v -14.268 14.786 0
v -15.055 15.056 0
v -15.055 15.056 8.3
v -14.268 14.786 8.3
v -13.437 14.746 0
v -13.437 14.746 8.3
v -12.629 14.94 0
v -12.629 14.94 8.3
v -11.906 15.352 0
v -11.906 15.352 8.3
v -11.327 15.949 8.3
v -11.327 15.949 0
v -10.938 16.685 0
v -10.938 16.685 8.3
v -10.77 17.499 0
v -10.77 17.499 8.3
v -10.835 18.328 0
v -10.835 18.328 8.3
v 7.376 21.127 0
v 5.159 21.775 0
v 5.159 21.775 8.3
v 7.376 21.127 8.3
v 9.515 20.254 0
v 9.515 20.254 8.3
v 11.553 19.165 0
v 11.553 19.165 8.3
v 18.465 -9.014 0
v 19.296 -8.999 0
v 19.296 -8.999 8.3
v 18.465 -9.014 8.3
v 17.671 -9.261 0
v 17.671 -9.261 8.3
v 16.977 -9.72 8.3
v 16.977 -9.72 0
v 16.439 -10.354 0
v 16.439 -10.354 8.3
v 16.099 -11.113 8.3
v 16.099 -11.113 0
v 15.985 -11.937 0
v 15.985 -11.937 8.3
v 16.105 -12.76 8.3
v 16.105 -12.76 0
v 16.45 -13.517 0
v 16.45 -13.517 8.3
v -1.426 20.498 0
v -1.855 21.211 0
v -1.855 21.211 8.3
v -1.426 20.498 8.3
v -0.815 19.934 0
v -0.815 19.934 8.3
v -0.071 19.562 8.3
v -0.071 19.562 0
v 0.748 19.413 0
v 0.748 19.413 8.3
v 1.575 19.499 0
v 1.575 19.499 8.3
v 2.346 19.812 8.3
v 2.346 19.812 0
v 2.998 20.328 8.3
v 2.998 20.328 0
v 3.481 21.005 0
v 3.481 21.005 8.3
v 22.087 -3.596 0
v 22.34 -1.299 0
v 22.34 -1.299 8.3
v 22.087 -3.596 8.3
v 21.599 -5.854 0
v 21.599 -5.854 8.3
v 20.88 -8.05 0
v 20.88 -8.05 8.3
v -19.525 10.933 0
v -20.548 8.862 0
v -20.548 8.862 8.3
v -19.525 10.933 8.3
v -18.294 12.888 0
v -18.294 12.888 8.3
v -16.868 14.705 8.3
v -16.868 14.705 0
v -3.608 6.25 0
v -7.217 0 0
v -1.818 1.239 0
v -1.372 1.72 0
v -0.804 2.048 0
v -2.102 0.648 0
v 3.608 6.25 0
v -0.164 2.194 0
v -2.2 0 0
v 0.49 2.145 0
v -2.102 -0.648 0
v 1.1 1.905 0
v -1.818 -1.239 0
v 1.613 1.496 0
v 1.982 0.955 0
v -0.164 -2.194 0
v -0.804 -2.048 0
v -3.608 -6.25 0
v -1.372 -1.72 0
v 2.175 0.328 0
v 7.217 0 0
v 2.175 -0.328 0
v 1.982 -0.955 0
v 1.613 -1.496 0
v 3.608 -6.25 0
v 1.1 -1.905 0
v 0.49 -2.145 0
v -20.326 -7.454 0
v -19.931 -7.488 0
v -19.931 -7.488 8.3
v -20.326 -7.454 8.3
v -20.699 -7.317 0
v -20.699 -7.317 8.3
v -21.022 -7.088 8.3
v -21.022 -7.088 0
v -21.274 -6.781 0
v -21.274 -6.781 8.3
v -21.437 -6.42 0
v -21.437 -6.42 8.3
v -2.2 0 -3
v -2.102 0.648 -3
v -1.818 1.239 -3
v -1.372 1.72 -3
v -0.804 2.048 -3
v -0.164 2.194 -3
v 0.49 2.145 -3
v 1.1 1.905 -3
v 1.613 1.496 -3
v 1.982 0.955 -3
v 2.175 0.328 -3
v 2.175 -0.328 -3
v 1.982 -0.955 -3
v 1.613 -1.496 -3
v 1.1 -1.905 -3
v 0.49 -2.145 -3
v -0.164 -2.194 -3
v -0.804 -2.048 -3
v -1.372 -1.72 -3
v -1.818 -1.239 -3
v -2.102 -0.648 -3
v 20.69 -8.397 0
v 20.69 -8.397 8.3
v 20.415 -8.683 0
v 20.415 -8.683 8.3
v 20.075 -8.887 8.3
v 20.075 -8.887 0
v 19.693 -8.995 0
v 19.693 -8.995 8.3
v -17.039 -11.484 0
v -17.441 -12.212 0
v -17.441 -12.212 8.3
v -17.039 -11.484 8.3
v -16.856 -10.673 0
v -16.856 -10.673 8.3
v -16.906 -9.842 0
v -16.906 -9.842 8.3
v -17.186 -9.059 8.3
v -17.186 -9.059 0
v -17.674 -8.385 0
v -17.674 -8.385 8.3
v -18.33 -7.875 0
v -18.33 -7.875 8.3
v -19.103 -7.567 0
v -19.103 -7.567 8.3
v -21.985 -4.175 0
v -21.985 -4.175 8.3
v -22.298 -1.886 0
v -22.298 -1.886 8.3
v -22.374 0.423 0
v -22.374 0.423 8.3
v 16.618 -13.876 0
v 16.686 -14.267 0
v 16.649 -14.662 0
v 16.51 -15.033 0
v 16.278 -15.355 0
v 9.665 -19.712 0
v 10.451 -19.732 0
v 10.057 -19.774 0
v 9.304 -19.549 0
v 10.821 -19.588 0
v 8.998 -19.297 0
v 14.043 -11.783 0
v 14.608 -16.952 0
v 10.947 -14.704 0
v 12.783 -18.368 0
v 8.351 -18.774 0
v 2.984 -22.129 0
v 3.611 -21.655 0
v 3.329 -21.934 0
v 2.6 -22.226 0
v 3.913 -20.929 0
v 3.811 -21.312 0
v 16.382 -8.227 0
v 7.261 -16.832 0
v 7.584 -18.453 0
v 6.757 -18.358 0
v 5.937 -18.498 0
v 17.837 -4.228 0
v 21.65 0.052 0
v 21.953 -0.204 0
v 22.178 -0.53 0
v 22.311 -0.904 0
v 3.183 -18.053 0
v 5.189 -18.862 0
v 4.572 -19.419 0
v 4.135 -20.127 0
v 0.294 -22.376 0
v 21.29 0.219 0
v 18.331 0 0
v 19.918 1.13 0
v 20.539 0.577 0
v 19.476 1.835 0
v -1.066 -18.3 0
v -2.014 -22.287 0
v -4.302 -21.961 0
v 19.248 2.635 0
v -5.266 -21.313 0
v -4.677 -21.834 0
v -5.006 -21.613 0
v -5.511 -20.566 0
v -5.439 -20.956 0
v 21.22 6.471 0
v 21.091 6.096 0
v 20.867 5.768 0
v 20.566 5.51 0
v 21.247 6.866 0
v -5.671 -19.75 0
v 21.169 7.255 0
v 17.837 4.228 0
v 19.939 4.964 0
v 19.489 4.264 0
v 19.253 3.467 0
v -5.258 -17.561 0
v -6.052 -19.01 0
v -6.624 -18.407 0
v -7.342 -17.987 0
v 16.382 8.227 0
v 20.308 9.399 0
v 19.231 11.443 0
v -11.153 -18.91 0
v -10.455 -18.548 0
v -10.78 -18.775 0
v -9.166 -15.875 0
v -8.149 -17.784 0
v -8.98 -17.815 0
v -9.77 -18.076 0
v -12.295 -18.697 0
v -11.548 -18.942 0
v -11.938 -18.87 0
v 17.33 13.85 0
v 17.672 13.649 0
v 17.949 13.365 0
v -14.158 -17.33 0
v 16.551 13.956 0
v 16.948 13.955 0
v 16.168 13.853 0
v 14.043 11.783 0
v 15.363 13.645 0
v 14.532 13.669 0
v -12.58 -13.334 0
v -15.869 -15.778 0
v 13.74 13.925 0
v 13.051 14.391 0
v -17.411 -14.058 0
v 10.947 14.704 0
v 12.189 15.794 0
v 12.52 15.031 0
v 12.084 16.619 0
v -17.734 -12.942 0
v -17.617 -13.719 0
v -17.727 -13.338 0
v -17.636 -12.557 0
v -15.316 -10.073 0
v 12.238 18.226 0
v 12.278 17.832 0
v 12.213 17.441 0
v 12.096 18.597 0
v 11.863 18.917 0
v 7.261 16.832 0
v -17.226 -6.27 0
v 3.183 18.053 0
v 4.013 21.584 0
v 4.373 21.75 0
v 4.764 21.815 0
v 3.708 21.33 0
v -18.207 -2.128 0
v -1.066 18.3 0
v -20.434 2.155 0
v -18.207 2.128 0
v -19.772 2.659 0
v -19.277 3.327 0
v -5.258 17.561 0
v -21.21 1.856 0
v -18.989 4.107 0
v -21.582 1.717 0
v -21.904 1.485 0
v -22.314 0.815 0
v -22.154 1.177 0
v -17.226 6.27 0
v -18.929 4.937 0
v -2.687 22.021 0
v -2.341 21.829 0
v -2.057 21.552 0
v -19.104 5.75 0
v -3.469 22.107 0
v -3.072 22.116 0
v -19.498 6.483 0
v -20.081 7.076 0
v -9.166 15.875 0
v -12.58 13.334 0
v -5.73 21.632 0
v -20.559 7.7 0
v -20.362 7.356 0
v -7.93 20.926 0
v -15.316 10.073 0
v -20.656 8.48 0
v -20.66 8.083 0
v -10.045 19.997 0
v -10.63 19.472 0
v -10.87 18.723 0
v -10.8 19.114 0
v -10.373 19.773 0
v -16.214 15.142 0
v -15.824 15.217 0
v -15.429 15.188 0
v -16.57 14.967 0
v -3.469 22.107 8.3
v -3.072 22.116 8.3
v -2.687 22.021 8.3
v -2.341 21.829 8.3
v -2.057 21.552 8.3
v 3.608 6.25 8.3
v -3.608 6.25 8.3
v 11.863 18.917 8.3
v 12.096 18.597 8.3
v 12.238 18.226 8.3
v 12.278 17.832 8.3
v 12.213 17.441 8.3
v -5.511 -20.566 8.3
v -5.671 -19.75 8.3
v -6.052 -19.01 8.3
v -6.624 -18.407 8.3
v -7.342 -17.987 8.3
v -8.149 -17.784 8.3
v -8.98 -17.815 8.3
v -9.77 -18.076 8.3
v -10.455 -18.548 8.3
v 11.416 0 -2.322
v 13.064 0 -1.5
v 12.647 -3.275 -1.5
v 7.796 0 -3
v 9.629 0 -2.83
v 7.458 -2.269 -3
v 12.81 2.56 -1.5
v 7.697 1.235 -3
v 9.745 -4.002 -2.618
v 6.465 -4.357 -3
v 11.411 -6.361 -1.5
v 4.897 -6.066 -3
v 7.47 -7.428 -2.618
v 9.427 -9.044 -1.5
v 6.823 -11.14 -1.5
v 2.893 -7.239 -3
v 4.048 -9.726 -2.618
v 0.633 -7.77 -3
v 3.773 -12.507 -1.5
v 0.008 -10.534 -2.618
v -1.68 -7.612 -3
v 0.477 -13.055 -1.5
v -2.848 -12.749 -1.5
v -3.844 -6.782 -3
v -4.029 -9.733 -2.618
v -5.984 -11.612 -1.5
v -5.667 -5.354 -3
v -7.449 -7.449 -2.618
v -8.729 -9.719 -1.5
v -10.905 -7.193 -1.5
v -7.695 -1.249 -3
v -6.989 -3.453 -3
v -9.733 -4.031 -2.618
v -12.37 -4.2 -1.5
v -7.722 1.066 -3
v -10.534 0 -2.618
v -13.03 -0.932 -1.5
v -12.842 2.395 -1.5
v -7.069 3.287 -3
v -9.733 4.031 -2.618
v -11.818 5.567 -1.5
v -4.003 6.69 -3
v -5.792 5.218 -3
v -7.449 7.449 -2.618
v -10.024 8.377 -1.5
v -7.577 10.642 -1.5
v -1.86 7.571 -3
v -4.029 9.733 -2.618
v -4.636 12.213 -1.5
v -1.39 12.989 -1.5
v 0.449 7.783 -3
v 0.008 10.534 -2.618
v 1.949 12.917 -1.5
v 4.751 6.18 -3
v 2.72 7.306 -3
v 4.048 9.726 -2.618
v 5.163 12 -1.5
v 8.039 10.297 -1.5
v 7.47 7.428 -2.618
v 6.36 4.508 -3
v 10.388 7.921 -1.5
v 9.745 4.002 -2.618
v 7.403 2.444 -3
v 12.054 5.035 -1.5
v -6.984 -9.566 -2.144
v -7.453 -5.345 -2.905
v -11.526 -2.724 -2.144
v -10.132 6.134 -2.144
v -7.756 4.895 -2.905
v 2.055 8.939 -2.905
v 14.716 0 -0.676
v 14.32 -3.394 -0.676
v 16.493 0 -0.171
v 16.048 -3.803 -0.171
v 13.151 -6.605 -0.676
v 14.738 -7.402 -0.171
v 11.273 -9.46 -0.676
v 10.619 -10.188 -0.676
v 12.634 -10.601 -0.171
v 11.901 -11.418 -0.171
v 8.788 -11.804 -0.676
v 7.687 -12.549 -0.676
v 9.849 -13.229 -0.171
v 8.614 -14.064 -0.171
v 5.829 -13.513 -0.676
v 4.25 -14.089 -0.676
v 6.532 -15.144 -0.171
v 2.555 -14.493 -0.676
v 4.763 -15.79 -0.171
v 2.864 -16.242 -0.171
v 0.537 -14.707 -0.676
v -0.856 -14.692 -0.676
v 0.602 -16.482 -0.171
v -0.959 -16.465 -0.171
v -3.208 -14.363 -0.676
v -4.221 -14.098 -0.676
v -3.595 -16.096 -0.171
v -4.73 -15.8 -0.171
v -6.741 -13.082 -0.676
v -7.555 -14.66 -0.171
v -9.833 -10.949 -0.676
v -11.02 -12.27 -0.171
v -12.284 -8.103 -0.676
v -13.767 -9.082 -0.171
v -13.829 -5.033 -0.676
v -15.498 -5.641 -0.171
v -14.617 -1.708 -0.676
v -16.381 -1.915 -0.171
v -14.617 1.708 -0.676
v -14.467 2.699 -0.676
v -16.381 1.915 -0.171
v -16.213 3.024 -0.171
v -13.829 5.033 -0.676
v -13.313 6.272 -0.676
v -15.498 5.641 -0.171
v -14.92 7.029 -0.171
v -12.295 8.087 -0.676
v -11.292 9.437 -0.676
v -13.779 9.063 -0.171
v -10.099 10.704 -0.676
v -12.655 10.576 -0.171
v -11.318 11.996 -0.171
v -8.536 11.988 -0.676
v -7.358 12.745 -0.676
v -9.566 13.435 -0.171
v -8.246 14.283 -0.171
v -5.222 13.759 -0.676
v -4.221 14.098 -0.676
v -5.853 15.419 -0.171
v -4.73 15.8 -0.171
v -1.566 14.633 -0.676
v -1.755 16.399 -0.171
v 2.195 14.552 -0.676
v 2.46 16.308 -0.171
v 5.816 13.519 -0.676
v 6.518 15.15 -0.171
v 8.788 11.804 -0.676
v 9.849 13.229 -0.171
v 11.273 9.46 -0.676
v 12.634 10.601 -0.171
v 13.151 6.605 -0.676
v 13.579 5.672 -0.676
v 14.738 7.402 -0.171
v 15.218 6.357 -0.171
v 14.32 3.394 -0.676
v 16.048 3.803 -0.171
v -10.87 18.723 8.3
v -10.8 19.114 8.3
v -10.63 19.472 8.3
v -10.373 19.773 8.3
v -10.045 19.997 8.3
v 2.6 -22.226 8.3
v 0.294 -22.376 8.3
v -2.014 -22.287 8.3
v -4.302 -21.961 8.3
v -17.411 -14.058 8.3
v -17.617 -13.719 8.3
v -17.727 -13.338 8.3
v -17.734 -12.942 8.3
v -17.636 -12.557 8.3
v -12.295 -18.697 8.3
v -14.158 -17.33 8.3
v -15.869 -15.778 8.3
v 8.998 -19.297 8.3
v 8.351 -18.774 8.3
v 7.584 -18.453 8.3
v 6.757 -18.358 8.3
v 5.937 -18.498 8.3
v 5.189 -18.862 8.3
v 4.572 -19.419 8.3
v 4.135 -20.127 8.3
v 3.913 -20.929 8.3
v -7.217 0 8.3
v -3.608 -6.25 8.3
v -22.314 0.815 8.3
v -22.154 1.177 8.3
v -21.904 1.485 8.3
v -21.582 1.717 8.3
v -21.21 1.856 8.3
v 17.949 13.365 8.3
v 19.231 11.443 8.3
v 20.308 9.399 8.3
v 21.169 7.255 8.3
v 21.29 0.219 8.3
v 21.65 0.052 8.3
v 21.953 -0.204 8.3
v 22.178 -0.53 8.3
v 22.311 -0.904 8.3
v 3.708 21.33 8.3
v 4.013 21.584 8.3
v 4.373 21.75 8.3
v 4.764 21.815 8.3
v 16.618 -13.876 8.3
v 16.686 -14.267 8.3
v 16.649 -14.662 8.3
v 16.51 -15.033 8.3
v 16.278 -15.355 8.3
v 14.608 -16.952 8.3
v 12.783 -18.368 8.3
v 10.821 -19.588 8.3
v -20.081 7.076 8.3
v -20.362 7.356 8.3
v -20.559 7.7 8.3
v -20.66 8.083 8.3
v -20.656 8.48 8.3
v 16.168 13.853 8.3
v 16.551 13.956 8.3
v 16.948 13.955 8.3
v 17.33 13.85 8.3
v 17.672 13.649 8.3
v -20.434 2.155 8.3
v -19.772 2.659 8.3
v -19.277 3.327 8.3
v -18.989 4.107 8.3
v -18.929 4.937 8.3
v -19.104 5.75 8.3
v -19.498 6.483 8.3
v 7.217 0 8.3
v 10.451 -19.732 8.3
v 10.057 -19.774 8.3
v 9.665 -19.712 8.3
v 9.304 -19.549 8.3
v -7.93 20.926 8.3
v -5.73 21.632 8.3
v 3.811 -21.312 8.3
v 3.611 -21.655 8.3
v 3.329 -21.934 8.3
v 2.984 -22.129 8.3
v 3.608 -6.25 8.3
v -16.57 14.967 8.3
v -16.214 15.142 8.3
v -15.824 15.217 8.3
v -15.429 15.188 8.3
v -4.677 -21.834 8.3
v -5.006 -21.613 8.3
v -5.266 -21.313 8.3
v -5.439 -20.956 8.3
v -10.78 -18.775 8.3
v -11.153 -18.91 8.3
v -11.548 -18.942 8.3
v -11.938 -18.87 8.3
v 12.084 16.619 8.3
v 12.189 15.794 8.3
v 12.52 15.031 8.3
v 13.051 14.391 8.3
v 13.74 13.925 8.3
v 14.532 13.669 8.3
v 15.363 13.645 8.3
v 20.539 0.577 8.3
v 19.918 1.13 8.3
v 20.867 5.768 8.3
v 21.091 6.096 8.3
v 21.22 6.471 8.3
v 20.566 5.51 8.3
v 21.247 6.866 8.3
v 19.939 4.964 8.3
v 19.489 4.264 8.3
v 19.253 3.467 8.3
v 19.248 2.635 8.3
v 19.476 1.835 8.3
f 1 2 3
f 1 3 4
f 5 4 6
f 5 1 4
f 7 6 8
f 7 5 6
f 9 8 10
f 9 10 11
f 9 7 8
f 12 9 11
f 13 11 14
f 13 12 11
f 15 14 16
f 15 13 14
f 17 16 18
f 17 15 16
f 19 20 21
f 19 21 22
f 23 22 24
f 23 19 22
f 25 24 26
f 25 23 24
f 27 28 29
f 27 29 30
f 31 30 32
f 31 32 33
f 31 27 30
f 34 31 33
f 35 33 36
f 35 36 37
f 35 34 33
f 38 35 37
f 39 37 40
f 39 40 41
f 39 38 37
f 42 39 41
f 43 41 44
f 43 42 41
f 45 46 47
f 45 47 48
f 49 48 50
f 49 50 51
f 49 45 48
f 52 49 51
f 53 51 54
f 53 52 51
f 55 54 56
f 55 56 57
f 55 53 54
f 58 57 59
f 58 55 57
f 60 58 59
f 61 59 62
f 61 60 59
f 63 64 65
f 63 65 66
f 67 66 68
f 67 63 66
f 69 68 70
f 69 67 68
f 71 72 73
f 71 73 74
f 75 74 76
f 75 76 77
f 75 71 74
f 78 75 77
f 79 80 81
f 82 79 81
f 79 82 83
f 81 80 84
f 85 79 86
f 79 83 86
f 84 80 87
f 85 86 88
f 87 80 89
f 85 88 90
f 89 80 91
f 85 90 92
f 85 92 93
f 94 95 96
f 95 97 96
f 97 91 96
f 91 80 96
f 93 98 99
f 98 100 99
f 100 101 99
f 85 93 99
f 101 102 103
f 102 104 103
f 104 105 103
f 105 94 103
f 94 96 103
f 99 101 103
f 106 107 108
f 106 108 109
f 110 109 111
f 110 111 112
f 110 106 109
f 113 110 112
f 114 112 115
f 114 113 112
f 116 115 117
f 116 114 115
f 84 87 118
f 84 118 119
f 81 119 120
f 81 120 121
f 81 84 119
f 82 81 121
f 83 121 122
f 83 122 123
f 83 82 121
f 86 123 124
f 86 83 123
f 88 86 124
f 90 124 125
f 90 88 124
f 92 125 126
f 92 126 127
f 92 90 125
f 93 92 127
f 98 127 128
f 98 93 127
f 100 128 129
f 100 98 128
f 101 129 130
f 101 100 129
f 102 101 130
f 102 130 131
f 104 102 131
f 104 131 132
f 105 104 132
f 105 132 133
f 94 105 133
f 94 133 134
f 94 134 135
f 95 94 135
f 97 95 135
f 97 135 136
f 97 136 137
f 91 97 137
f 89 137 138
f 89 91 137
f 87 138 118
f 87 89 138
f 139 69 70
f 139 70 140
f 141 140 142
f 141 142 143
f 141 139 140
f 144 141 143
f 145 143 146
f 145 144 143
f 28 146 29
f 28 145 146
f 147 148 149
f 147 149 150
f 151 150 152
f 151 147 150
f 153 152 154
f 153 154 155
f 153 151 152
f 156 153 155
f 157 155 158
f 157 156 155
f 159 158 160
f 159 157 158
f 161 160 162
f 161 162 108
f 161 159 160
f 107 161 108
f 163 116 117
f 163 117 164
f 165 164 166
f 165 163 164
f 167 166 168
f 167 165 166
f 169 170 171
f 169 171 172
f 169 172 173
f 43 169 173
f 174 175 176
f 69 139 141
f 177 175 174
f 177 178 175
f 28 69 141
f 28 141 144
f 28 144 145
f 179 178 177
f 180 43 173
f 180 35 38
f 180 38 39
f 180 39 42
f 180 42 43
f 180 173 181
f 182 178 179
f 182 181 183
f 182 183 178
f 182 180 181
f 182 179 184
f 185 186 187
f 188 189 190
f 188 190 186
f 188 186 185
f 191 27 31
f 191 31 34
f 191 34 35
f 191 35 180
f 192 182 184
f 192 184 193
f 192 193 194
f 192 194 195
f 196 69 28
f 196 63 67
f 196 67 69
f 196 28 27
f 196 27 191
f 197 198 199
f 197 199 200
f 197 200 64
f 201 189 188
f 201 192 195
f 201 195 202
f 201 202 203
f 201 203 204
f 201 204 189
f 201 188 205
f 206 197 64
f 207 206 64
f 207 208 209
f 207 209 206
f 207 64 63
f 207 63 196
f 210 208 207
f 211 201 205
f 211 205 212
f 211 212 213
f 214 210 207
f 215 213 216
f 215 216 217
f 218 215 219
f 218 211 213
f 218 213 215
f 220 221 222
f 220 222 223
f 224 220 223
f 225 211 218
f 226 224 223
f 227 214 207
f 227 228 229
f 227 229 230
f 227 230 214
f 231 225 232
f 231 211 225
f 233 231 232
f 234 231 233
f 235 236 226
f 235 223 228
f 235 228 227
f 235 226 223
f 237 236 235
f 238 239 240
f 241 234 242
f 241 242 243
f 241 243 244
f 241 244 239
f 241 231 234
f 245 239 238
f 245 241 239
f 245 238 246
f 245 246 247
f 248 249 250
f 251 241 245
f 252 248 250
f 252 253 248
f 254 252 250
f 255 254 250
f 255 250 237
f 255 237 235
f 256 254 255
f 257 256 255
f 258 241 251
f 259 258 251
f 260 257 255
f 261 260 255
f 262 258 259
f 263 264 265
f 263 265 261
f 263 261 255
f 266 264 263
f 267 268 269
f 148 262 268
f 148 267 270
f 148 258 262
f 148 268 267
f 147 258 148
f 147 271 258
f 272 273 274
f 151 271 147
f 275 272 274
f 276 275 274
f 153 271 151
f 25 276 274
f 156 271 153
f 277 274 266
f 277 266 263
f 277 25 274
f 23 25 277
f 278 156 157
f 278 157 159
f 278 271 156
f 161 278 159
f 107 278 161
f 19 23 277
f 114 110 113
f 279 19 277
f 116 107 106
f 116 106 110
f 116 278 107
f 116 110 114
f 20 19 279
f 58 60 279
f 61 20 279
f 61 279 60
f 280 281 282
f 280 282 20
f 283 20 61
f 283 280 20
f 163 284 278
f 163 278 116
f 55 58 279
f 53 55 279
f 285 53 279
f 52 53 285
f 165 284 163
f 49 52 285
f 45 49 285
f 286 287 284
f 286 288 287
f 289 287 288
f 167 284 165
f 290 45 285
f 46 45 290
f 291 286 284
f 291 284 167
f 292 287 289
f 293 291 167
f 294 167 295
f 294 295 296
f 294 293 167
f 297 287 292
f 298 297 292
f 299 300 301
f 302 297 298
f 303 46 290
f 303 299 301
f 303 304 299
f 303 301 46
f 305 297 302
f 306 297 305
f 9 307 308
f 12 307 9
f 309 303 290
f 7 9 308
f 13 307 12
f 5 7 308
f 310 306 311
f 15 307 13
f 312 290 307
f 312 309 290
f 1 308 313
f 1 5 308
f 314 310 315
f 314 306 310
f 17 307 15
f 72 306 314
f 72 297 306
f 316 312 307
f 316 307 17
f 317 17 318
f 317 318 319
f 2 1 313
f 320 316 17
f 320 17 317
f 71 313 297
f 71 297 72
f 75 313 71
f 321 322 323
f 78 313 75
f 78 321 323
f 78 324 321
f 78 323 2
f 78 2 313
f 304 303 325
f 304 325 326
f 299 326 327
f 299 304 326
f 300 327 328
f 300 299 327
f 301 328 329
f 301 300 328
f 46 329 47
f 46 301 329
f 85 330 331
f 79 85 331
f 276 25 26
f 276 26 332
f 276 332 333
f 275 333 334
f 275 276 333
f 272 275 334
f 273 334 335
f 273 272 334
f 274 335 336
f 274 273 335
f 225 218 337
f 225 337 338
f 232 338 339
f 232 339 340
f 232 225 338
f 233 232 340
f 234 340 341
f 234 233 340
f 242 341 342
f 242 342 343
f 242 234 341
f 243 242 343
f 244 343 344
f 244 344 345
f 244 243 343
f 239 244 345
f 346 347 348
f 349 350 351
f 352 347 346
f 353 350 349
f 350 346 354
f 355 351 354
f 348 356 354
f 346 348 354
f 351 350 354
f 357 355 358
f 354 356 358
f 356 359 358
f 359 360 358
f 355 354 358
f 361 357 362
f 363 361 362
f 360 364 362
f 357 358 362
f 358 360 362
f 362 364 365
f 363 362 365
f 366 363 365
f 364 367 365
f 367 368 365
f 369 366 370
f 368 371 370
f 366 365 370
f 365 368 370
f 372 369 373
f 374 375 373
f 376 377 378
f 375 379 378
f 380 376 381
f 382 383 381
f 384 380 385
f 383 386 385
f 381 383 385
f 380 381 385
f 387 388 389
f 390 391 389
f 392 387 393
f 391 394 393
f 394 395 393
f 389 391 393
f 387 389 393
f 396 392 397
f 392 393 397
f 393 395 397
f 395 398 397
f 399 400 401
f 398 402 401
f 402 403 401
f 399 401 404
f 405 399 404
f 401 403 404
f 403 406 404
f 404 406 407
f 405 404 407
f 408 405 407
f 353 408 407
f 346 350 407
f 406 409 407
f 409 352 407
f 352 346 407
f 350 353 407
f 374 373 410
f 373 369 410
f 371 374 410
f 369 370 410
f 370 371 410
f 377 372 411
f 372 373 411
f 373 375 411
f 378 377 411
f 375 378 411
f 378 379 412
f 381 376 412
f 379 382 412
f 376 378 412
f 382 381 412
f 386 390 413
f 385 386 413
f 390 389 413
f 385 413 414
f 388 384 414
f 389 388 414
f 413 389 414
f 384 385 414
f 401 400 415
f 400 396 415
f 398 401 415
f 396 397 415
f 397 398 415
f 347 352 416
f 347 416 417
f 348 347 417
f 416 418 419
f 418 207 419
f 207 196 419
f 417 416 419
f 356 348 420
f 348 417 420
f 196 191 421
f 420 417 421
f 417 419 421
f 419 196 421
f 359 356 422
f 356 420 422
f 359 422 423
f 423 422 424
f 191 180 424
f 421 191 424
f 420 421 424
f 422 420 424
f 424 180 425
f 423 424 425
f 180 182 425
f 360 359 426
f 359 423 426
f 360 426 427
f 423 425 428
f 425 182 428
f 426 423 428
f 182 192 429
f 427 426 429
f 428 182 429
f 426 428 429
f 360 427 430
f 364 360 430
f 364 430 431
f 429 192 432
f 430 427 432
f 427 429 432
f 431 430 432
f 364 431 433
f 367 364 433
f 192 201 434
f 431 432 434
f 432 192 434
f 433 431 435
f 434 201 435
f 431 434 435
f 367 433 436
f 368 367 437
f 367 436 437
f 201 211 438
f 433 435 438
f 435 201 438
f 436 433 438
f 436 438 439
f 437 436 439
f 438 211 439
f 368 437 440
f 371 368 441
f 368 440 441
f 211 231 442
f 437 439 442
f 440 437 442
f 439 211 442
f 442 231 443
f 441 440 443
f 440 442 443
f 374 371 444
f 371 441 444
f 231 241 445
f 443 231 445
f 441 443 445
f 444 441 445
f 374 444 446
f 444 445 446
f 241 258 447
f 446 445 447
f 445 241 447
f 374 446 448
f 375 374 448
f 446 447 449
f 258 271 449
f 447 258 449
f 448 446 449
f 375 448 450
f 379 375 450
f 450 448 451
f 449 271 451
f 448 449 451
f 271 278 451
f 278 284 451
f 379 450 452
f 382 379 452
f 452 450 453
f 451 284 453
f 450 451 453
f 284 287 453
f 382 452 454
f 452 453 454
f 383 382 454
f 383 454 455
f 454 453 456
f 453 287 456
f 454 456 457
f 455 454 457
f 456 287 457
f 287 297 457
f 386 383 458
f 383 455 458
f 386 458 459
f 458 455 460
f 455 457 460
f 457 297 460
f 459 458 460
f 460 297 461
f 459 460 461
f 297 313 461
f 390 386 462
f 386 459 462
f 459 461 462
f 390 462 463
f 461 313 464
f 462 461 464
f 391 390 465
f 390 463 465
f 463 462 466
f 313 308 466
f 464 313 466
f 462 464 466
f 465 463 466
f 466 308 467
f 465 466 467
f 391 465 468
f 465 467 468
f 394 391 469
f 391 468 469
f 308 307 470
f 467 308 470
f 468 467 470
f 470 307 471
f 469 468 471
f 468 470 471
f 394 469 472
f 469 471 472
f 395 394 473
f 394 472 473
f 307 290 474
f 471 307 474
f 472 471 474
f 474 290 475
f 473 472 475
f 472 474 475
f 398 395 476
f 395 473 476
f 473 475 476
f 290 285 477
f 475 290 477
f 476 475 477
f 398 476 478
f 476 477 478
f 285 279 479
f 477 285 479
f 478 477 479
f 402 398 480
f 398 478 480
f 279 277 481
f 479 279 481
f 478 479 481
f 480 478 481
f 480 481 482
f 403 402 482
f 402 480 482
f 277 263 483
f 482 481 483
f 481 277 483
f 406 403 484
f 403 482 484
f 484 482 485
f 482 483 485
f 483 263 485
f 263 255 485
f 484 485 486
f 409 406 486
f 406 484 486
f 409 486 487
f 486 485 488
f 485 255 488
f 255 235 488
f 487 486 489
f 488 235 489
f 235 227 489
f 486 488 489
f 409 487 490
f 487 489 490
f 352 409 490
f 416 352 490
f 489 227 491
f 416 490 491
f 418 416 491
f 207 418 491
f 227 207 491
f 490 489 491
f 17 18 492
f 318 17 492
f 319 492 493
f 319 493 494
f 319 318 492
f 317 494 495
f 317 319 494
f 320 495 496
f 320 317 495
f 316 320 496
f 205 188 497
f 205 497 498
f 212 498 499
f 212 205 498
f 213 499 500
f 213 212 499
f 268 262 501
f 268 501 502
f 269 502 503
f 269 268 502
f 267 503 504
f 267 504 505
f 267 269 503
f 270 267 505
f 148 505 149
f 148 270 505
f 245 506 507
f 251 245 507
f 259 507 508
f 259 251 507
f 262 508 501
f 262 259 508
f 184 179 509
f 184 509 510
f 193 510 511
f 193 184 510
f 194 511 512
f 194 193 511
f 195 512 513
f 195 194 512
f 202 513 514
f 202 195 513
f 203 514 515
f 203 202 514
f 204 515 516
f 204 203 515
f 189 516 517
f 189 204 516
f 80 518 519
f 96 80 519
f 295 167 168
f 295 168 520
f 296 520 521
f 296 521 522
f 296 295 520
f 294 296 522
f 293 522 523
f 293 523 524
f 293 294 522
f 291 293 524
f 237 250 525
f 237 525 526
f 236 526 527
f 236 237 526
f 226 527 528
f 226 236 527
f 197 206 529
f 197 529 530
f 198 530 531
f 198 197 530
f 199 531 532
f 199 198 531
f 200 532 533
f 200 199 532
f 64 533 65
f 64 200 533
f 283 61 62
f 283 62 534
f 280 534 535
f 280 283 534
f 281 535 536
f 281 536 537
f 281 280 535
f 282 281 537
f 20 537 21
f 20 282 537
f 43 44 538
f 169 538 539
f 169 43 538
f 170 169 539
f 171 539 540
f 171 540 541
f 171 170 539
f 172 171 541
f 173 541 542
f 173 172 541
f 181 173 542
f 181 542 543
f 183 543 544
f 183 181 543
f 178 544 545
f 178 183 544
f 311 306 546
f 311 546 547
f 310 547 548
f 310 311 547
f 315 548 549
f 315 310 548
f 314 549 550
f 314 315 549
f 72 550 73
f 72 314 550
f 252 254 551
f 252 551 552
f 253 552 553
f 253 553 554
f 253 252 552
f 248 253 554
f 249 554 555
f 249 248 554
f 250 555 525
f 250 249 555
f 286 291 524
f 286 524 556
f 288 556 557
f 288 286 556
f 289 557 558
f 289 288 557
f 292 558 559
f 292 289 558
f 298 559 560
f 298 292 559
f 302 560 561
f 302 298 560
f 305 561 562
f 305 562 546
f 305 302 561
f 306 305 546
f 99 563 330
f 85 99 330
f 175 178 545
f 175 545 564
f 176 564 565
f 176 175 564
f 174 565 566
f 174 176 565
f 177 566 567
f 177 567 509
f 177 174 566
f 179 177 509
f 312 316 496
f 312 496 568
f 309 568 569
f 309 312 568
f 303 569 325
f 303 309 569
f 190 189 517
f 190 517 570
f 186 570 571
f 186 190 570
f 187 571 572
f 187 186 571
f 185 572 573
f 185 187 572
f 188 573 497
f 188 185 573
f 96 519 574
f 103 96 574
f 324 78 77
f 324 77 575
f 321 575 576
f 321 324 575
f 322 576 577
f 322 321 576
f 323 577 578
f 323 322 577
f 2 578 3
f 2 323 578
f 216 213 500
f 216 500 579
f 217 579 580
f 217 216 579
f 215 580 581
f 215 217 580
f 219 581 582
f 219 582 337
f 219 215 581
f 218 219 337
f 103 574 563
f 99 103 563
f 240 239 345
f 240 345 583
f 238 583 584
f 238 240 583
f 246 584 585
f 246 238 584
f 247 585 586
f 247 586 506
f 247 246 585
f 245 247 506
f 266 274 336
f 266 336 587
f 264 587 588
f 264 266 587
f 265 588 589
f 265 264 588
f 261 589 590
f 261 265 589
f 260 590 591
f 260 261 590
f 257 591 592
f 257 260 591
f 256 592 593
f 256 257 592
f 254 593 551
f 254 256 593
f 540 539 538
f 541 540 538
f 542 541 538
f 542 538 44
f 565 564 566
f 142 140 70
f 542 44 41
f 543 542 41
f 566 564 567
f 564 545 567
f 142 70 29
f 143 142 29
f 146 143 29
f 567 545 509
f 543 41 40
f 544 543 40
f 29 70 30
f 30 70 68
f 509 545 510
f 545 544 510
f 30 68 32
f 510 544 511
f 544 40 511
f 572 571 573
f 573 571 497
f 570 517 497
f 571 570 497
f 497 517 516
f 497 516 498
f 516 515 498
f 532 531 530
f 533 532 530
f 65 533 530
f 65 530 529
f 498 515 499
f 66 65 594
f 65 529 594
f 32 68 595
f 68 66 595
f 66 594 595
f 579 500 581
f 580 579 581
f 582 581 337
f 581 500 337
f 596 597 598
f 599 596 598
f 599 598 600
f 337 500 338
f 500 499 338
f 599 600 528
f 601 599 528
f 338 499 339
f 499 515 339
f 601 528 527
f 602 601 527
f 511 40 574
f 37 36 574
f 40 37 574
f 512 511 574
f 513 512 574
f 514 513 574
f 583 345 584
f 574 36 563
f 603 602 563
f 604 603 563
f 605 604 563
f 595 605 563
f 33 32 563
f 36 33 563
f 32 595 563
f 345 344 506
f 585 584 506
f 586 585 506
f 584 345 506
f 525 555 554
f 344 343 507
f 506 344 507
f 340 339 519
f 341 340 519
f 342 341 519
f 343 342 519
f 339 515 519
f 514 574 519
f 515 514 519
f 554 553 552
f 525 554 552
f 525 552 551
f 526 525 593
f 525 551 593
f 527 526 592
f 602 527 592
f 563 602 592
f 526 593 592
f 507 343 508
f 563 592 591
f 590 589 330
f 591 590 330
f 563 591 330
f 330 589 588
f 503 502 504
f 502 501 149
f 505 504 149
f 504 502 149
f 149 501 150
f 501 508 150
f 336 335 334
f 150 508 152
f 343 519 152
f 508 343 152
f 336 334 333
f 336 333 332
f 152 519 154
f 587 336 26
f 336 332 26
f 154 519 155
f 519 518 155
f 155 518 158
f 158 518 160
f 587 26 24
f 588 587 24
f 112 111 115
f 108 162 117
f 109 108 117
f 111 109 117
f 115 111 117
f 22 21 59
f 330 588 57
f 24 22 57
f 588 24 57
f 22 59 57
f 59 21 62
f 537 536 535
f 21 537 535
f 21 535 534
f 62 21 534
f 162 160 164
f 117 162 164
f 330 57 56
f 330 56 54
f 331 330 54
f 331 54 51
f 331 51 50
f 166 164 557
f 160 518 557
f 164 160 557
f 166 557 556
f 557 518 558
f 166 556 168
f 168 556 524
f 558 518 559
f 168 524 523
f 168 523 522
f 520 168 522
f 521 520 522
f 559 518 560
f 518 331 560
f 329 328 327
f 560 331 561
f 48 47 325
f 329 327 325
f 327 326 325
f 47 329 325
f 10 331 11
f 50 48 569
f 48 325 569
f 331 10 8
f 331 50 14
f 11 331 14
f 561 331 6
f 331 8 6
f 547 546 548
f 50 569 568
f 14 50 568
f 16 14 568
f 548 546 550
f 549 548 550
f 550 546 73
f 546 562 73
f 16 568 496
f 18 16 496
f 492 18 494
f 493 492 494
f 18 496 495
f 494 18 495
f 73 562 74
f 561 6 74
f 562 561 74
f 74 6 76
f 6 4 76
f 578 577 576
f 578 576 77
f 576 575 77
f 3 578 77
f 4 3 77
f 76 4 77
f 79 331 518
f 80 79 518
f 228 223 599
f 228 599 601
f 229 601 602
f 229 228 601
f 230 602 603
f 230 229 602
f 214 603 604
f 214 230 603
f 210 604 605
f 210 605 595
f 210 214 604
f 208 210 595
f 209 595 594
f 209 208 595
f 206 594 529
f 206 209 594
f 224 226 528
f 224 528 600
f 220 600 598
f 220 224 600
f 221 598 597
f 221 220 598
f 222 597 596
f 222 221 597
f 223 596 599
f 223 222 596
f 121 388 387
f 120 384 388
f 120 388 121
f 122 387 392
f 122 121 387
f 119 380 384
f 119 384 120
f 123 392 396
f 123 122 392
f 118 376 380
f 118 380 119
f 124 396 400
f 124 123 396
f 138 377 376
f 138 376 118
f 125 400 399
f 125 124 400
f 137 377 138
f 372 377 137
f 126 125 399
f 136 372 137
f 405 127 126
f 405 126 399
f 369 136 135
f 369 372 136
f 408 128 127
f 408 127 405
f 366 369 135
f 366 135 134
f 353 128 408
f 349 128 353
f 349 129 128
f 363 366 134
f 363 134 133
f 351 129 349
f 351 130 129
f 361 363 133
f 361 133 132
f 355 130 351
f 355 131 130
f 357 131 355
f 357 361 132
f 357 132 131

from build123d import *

# Parameters (mm, degrees)
CROQUIS1_R              = 2.2
SALIENTE_EXTRUIR1_DEPTH = 8.3
CORTAR_EXTRUIR1_DEPTH   = 10
CROQUIS3_R              = 11.19
CROQUIS3_R_2            = 2.2
SALIENTE_EXTRUIR2_DEPTH = 3
REDONDEO1_R             = 10
REDONDEO2_R             = 10


with BuildPart() as part:
    # Croquis1 → Saliente-Extruir1 (new body)
    with BuildSketch(Plane.XY):
        with BuildLine():
            ThreePointArc((-1.855132773, 21.210566025), (0.747663665, 19.413438157), (3.480969897, 21.005058374))
            ThreePointArc((3.480969897, 21.005058374), (4.187425829, 21.678765959), (5.158862158, 21.775064198))
            ThreePointArc((5.158862158, 21.775064198), (8.457254598, 20.718159287), (11.553044037, 19.164927682))
            ThreePointArc((11.553044037, 19.164927682), (12.17958806, 18.416325998), (12.212774884, 17.4406926))
            ThreePointArc((12.212774884, 17.4406926), (13.051461105, 14.390967482), (16.16836891, 13.853283925))
            ThreePointArc((16.16836891, 13.853283925), (17.142596439, 13.915272757), (17.948659156, 13.364614252))
            ThreePointArc((17.948659156, 13.364614252), (19.796008974, 10.434812326), (21.16912324, 7.255032793))
            ThreePointArc((21.16912324, 7.255032793), (21.16789192, 6.278835898), (20.566189442, 5.510125275))
            ThreePointArc((20.566189442, 5.510125275), (19.248334843, 2.634803184), (21.290408418, 0.219403966))
            ThreePointArc((21.290408418, 0.219403966), (22.076555656, -0.359331218), (22.340079057, -1.299287234))
            ThreePointArc((22.340079057, -1.299287234), (21.871990743, -4.731099292), (20.879934411, -8.049572571))
            ThreePointArc((20.879934411, -8.049572571), (20.251503896, -8.796591301), (19.296455393, -8.998690904))
            ThreePointArc((19.296455393, -8.998690904), (16.438698786, -10.354214806), (16.450429211, -13.517137548))
            ThreePointArc((16.450429211, -13.517137548), (16.680649129, -14.465800124), (16.278327685, -15.355237783))
            ThreePointArc((16.278327685, -15.355237783), (13.713824964, -17.683276971), (10.820792216, -19.587693468))
            ThreePointArc((10.820792216, -19.587693468), (9.859212129, -19.755995666), (8.997695409, -19.2969196))
            ThreePointArc((8.997695409, -19.2969196), (5.937212872, -18.498380614), (3.91311135, -20.928860176))
            ThreePointArc((3.91311135, -20.928860176), (3.479681489, -21.803560382), (2.599765876, -22.226301918))
            ThreePointArc((2.599765876, -22.226301918), (-0.861191929, -22.361252828), (-4.301518916, -21.960514898))
            ThreePointArc((-4.301518916, -21.960514898), (-5.146314566, -21.471350096), (-5.511186255, -20.565905154))
            ThreePointArc((-5.511186255, -20.565905154), (-7.34236093, -17.986948546), (-10.455194801, -18.54773653))
            ThreePointArc((-10.455194801, -18.54773653), (-11.349467792, -18.939192417), (-12.29525528, -18.697432369))
            ThreePointArc((-12.29525528, -18.697432369), (-15.033247546, -16.576149969), (-17.411101542, -14.057767343))
            ThreePointArc((-17.411101542, -14.057767343), (-17.743823481, -13.140021189), (-17.44132262, -12.211875121))
            ThreePointArc((-17.44132262, -12.211875121), (-17.186362452, -9.059223351), (-19.931399108, -7.487920827))
            ThreePointArc((-19.931399108, -7.487920827), (-20.868074958, -7.212965835), (-21.437189843, -6.419826415))
            ThreePointArc((-21.437189843, -6.419826415), (-22.171079561, -3.034882316), (-22.373836253, 0.422765786))
            ThreePointArc((-22.373836253, 0.422765786), (-22.038800189, 1.339669668), (-21.210470293, 1.856227))
            ThreePointArc((-21.210470293, 1.856227), (-18.988673977, 4.107413132), (-20.08148026, 7.075576251))
            ThreePointArc((-20.08148026, 7.075576251), (-20.622277928, 7.888287624), (-20.548425031, 8.861687667))
            ThreePointArc((-20.548425031, 8.861687667), (-18.934817045, 11.926440502), (-16.867604324, 14.705482106))
            ThreePointArc((-16.867604324, 14.705482106), (-16.021577354, 15.192514199), (-15.055003187, 15.055779879))
            ThreePointArc((-15.055003187, 15.055779879), (-11.905973913, 15.352145362), (-10.835213617, 18.328332564))
            ThreePointArc((-10.835213617, 18.328332564), (-10.727087865, 19.298523636), (-10.044823777, 19.996719603))
            ThreePointArc((-10.044823777, 19.996719603), (-6.838743197, 21.307249261), (-3.468832869, 22.107339915))
            ThreePointArc((-3.468832869, 22.107339915), (-2.507680415, 21.936612489), (-1.855132773, 21.210566025))
        make_face()
        with Locations(Location((0, 0, 0), (0, 0, 180))):
            Circle(CROQUIS1_R, mode=Mode.SUBTRACT)
    extrude(amount=SALIENTE_EXTRUIR1_DEPTH)

    # Croquis2 → Cortar-Extruir1 (cut)
    with BuildSketch(Plane.XY.offset(8.3)):
        Polygon((7.216878365, 0), (3.608439182, 6.25), (-3.608439182, 6.25), (-7.216878365, 0), (-3.608439182, -6.25), (3.608439182, -6.25), align=None)
    extrude(amount=-CORTAR_EXTRUIR1_DEPTH, mode=Mode.SUBTRACT)

    # Croquis3 → Saliente-Extruir2 (add)
    with BuildSketch(Plane(origin=(0, 0, 0), x_dir=(-1, 0, 0), z_dir=(0, 0, -1))):
        with Locations(Location((0, 0, 0), (0, 0, 180))):
            Circle(CROQUIS3_R)
        Circle(CROQUIS3_R_2, mode=Mode.SUBTRACT)
    extrude(amount=SALIENTE_EXTRUIR2_DEPTH)

    # Redondeo1
    # the kernel refuses this fillet: 10 mm, written as the material it adds along each edge
    with BuildSketch(Plane(origin=(0, 0, 0), x_dir=(1, 0, 0), z_dir=(0, 1, 0))) as redondeo1_piece_1:
        with BuildLine():
            CenterArc((18.331428429, 10), REDONDEO1_R, 224.427004001, 45.572995999)
            Line((11.19, 3), (11.047171431, 2.86))
            ThreePointArc((11.047171431, 2.86), (10.99, 1.5), (10.99, 0))
            Line((10.99, 0), (11.19, -0.2))
            Line((11.19, -0.2), (18.331428429, -0.2))
            Line((18.331428429, -0.2), (18.331428429, 0))
        make_face()
    revolve(axis=Axis((0, 0, 0), (0, 0, -1)))

    # Redondeo2
    redondeo2_edges = [part.edges().sort_by_distance(p)[0] for p in [
        (-11.19, 0, -3),
    ]]
    fillet(redondeo2_edges, radius=REDONDEO2_R)


solid = part.part
